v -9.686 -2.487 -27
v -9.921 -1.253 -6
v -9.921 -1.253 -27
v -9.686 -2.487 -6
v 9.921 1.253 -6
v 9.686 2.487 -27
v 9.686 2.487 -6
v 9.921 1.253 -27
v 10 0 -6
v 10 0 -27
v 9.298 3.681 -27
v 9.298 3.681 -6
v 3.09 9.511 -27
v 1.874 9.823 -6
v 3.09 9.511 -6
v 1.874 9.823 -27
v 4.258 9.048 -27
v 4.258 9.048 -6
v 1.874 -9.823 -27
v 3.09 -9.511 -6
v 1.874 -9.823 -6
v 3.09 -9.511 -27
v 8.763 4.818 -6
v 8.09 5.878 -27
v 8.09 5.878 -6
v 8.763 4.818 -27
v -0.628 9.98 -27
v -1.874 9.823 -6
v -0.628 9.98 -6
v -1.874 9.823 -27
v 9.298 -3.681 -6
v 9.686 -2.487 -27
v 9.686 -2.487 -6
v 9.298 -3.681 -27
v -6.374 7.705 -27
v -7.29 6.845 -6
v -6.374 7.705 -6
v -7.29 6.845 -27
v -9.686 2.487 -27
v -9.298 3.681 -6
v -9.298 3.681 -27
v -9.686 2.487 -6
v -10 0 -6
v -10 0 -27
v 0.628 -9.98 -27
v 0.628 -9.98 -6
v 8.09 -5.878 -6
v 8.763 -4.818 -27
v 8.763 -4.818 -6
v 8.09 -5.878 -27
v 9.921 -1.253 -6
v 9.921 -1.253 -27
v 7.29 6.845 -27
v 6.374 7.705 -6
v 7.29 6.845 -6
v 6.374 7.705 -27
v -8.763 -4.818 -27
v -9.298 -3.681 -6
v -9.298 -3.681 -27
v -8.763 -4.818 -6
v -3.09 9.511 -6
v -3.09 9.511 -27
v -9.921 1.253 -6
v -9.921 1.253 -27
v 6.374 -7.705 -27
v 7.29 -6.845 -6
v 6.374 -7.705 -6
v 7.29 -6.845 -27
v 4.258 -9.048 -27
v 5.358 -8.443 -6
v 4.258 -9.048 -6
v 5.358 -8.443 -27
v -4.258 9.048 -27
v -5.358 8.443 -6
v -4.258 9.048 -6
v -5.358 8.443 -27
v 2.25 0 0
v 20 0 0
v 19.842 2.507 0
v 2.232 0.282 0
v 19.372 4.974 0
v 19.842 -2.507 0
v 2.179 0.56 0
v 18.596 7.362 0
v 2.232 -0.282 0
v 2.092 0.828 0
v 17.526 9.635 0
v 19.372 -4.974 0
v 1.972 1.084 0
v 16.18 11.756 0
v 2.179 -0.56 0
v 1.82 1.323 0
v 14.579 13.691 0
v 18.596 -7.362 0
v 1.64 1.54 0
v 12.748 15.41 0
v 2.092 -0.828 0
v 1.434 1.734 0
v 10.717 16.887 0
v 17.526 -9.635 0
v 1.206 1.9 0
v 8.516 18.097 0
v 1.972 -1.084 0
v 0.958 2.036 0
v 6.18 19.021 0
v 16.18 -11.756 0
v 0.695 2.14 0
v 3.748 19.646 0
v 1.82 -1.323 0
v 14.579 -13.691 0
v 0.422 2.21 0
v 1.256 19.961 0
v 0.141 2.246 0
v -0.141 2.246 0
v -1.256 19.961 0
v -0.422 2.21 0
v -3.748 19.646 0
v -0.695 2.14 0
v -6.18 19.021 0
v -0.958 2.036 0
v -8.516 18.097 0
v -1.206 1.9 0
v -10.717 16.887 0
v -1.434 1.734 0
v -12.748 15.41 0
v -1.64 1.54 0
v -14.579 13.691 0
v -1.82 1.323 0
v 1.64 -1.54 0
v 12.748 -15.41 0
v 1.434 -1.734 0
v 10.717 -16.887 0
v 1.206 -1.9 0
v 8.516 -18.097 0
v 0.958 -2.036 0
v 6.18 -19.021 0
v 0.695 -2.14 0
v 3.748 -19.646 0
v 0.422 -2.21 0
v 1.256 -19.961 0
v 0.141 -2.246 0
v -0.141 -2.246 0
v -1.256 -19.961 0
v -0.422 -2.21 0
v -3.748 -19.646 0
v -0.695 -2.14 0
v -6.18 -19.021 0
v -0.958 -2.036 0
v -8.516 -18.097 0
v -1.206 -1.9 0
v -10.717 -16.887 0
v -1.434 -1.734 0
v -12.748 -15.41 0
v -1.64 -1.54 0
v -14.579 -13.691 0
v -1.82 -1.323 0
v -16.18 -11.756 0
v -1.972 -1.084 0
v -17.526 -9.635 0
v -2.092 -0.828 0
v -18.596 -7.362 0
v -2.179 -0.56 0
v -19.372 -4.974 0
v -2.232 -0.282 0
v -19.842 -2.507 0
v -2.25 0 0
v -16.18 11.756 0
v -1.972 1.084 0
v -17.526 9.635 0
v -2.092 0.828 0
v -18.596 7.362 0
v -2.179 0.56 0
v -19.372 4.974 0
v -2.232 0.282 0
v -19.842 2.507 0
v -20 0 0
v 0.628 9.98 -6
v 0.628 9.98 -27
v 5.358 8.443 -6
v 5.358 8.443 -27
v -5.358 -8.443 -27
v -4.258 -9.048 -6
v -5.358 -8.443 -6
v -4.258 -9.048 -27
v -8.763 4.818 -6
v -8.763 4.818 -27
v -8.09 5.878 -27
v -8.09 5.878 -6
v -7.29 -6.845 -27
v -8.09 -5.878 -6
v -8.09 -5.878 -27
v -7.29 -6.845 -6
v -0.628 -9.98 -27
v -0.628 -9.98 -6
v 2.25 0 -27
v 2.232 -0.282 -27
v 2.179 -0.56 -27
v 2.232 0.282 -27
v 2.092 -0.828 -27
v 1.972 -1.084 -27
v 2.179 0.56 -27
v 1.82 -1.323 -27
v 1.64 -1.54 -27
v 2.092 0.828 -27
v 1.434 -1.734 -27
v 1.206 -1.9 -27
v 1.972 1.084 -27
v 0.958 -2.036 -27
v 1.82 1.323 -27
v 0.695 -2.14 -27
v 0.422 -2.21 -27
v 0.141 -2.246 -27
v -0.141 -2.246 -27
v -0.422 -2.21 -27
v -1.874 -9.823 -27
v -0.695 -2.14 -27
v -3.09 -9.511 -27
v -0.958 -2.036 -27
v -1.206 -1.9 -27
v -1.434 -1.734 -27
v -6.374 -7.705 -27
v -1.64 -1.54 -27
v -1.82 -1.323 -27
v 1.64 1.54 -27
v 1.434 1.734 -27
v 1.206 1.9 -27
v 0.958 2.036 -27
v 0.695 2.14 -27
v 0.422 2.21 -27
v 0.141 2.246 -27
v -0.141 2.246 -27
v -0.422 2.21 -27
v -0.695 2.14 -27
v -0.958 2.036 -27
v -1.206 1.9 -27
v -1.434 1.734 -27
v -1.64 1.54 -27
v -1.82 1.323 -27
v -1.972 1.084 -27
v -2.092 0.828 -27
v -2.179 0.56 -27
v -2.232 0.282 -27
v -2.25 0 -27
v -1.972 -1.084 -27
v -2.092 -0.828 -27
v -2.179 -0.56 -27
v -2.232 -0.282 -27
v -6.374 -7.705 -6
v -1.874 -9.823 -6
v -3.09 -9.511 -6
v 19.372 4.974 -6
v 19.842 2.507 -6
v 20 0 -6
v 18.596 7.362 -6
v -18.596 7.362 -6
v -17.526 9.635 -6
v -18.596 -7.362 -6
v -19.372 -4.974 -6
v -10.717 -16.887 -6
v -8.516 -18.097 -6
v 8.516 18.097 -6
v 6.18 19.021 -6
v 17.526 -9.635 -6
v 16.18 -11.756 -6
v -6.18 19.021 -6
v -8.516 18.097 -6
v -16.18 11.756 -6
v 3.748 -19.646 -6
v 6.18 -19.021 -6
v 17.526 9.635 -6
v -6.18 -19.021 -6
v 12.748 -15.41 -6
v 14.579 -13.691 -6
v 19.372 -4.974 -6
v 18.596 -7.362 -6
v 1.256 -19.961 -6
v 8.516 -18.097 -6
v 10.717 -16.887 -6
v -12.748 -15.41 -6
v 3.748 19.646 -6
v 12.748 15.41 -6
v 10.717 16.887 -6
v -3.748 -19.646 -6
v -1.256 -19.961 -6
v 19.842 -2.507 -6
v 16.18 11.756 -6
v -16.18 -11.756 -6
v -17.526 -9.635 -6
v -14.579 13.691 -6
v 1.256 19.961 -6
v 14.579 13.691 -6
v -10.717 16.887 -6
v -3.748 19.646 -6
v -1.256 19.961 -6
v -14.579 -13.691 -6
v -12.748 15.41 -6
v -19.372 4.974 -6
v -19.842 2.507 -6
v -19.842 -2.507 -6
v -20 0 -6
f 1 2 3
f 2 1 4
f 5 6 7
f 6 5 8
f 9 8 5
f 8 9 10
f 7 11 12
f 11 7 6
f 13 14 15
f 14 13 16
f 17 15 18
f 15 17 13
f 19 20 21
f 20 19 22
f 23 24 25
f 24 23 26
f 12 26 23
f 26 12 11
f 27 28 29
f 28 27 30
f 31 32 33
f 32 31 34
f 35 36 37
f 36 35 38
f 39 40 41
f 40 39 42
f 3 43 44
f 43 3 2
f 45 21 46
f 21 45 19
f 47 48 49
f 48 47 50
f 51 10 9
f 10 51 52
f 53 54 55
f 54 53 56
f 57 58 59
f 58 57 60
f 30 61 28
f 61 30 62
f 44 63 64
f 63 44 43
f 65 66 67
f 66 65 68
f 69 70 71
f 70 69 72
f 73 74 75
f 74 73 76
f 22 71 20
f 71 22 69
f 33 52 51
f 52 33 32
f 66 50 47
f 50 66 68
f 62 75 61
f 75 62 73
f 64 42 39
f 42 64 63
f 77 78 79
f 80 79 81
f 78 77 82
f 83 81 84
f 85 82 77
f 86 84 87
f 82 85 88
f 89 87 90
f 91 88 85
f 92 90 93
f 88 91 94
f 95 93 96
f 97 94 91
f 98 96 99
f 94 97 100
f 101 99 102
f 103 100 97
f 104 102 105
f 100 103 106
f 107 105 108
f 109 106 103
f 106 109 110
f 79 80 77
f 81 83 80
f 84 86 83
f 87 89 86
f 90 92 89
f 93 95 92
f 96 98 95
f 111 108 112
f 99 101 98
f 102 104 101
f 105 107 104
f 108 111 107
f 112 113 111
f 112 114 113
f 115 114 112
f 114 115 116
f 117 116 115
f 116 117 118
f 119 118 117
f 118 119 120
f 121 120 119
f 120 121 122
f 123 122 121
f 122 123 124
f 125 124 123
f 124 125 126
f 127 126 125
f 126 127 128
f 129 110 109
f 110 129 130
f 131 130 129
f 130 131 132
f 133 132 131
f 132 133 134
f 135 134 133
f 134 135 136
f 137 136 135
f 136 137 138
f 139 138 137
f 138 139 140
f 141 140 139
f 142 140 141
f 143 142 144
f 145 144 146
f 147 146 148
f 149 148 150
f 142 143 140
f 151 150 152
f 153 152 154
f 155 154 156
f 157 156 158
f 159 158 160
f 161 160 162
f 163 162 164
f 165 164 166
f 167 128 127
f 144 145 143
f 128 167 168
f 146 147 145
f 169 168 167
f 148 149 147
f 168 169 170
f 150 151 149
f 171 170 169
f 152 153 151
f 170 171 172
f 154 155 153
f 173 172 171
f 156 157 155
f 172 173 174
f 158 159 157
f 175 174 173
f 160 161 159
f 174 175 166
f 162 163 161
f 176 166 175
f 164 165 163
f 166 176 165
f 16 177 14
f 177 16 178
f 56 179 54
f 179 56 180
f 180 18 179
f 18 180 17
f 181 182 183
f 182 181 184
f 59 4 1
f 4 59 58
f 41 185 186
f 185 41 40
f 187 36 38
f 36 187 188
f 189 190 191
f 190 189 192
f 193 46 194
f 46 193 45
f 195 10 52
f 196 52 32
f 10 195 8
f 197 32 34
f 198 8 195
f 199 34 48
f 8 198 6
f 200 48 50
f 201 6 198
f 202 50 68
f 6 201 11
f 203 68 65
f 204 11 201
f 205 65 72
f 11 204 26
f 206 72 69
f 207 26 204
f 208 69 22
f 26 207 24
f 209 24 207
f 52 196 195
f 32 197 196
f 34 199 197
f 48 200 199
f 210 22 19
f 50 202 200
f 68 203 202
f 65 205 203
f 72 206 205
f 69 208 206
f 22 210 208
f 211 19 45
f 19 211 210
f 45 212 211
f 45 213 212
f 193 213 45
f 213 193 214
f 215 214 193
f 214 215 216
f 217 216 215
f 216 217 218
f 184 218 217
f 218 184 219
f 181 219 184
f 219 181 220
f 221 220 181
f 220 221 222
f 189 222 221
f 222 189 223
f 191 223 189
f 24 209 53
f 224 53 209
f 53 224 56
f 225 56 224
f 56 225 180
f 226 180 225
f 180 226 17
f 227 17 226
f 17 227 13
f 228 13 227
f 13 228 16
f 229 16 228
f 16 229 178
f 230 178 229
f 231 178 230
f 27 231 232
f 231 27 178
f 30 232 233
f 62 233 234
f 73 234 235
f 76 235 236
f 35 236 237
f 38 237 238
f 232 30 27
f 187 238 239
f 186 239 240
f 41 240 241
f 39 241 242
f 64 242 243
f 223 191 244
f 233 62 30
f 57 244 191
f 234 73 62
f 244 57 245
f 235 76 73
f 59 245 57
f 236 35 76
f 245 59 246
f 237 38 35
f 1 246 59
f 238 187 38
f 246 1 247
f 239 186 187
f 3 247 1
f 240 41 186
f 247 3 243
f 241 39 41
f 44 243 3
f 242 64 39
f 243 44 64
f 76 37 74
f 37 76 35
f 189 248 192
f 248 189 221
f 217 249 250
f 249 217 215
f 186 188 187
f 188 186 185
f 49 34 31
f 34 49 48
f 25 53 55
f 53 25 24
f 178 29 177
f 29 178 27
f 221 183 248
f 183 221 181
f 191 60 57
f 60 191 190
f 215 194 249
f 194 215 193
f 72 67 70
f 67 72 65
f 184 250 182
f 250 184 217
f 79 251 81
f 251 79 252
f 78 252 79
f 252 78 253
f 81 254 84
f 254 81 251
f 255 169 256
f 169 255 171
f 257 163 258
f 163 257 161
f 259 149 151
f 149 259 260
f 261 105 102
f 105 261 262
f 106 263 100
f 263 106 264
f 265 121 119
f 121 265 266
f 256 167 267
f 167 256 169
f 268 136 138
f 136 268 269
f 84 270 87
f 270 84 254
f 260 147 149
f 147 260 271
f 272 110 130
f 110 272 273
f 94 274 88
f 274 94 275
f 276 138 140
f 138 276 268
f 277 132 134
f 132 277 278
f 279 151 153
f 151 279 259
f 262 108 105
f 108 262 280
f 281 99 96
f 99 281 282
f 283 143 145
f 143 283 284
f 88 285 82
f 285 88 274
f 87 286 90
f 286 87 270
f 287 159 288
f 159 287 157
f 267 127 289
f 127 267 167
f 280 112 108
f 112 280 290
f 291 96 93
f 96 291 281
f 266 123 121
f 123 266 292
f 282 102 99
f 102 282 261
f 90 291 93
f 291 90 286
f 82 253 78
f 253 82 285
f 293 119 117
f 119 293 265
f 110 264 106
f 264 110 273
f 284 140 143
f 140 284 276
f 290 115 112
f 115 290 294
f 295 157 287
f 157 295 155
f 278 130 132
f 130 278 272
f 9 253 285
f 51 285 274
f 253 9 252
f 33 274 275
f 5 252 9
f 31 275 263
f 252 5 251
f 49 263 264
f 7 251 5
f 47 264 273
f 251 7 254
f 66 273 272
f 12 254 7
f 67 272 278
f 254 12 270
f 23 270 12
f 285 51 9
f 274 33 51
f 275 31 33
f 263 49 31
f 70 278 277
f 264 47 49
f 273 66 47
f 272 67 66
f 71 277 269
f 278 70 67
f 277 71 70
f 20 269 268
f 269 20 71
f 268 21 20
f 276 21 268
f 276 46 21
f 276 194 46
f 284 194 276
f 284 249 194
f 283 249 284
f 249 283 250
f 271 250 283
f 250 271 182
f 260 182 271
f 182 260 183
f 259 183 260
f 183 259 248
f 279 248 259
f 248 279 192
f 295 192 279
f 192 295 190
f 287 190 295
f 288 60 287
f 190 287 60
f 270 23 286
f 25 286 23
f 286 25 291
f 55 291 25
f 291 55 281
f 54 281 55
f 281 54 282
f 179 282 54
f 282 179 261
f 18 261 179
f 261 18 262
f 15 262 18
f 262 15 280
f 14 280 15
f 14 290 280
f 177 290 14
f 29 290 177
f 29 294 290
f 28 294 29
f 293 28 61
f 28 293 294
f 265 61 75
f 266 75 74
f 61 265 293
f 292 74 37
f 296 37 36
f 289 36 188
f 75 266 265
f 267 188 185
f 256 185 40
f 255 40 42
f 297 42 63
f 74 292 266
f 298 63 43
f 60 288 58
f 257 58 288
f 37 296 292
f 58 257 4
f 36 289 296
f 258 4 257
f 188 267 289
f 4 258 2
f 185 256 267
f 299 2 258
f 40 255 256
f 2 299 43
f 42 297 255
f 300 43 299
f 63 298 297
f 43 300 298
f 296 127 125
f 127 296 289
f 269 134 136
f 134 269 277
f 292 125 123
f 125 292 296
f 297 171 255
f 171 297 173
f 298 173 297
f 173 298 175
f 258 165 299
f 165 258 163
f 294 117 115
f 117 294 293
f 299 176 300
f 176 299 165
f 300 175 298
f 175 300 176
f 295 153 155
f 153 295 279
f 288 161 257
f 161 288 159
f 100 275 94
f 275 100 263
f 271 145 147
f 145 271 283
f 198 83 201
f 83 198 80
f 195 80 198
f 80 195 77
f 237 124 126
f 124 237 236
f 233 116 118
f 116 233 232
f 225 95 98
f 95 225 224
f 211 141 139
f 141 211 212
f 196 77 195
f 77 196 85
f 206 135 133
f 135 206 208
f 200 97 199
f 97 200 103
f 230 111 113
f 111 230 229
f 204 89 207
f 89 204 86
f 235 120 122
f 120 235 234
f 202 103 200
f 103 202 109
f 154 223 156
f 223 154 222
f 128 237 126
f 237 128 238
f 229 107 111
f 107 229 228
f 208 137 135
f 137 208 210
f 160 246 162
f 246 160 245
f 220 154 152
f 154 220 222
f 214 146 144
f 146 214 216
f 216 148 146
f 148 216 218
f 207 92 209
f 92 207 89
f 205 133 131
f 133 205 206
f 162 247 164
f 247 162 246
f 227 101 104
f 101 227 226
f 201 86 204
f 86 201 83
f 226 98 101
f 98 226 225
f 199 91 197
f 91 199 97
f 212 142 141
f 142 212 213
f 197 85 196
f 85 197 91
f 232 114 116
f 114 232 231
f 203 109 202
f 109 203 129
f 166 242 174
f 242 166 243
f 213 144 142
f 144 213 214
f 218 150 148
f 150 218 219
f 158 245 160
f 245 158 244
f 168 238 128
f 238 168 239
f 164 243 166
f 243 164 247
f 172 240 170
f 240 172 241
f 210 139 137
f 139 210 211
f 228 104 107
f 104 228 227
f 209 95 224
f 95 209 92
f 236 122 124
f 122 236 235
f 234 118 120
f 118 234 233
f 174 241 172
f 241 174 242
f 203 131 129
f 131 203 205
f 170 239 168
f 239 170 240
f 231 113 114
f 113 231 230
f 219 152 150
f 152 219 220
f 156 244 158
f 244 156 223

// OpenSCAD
$fn = 50;


difference() {
	union() {
		translate(v = [0, 0, -27.0000000000]) {
			cylinder(h = 27, r = 10.0000000000);
		}
		translate(v = [0, 0, -6.0000000000]) {
			cylinder(h = 6, r = 20.0000000000);
		}
	}
	union() {
		#translate(v = [0, 0, -27]) {
			cylinder(h = 27, r = 2.2500000000);
		}
	}
}
